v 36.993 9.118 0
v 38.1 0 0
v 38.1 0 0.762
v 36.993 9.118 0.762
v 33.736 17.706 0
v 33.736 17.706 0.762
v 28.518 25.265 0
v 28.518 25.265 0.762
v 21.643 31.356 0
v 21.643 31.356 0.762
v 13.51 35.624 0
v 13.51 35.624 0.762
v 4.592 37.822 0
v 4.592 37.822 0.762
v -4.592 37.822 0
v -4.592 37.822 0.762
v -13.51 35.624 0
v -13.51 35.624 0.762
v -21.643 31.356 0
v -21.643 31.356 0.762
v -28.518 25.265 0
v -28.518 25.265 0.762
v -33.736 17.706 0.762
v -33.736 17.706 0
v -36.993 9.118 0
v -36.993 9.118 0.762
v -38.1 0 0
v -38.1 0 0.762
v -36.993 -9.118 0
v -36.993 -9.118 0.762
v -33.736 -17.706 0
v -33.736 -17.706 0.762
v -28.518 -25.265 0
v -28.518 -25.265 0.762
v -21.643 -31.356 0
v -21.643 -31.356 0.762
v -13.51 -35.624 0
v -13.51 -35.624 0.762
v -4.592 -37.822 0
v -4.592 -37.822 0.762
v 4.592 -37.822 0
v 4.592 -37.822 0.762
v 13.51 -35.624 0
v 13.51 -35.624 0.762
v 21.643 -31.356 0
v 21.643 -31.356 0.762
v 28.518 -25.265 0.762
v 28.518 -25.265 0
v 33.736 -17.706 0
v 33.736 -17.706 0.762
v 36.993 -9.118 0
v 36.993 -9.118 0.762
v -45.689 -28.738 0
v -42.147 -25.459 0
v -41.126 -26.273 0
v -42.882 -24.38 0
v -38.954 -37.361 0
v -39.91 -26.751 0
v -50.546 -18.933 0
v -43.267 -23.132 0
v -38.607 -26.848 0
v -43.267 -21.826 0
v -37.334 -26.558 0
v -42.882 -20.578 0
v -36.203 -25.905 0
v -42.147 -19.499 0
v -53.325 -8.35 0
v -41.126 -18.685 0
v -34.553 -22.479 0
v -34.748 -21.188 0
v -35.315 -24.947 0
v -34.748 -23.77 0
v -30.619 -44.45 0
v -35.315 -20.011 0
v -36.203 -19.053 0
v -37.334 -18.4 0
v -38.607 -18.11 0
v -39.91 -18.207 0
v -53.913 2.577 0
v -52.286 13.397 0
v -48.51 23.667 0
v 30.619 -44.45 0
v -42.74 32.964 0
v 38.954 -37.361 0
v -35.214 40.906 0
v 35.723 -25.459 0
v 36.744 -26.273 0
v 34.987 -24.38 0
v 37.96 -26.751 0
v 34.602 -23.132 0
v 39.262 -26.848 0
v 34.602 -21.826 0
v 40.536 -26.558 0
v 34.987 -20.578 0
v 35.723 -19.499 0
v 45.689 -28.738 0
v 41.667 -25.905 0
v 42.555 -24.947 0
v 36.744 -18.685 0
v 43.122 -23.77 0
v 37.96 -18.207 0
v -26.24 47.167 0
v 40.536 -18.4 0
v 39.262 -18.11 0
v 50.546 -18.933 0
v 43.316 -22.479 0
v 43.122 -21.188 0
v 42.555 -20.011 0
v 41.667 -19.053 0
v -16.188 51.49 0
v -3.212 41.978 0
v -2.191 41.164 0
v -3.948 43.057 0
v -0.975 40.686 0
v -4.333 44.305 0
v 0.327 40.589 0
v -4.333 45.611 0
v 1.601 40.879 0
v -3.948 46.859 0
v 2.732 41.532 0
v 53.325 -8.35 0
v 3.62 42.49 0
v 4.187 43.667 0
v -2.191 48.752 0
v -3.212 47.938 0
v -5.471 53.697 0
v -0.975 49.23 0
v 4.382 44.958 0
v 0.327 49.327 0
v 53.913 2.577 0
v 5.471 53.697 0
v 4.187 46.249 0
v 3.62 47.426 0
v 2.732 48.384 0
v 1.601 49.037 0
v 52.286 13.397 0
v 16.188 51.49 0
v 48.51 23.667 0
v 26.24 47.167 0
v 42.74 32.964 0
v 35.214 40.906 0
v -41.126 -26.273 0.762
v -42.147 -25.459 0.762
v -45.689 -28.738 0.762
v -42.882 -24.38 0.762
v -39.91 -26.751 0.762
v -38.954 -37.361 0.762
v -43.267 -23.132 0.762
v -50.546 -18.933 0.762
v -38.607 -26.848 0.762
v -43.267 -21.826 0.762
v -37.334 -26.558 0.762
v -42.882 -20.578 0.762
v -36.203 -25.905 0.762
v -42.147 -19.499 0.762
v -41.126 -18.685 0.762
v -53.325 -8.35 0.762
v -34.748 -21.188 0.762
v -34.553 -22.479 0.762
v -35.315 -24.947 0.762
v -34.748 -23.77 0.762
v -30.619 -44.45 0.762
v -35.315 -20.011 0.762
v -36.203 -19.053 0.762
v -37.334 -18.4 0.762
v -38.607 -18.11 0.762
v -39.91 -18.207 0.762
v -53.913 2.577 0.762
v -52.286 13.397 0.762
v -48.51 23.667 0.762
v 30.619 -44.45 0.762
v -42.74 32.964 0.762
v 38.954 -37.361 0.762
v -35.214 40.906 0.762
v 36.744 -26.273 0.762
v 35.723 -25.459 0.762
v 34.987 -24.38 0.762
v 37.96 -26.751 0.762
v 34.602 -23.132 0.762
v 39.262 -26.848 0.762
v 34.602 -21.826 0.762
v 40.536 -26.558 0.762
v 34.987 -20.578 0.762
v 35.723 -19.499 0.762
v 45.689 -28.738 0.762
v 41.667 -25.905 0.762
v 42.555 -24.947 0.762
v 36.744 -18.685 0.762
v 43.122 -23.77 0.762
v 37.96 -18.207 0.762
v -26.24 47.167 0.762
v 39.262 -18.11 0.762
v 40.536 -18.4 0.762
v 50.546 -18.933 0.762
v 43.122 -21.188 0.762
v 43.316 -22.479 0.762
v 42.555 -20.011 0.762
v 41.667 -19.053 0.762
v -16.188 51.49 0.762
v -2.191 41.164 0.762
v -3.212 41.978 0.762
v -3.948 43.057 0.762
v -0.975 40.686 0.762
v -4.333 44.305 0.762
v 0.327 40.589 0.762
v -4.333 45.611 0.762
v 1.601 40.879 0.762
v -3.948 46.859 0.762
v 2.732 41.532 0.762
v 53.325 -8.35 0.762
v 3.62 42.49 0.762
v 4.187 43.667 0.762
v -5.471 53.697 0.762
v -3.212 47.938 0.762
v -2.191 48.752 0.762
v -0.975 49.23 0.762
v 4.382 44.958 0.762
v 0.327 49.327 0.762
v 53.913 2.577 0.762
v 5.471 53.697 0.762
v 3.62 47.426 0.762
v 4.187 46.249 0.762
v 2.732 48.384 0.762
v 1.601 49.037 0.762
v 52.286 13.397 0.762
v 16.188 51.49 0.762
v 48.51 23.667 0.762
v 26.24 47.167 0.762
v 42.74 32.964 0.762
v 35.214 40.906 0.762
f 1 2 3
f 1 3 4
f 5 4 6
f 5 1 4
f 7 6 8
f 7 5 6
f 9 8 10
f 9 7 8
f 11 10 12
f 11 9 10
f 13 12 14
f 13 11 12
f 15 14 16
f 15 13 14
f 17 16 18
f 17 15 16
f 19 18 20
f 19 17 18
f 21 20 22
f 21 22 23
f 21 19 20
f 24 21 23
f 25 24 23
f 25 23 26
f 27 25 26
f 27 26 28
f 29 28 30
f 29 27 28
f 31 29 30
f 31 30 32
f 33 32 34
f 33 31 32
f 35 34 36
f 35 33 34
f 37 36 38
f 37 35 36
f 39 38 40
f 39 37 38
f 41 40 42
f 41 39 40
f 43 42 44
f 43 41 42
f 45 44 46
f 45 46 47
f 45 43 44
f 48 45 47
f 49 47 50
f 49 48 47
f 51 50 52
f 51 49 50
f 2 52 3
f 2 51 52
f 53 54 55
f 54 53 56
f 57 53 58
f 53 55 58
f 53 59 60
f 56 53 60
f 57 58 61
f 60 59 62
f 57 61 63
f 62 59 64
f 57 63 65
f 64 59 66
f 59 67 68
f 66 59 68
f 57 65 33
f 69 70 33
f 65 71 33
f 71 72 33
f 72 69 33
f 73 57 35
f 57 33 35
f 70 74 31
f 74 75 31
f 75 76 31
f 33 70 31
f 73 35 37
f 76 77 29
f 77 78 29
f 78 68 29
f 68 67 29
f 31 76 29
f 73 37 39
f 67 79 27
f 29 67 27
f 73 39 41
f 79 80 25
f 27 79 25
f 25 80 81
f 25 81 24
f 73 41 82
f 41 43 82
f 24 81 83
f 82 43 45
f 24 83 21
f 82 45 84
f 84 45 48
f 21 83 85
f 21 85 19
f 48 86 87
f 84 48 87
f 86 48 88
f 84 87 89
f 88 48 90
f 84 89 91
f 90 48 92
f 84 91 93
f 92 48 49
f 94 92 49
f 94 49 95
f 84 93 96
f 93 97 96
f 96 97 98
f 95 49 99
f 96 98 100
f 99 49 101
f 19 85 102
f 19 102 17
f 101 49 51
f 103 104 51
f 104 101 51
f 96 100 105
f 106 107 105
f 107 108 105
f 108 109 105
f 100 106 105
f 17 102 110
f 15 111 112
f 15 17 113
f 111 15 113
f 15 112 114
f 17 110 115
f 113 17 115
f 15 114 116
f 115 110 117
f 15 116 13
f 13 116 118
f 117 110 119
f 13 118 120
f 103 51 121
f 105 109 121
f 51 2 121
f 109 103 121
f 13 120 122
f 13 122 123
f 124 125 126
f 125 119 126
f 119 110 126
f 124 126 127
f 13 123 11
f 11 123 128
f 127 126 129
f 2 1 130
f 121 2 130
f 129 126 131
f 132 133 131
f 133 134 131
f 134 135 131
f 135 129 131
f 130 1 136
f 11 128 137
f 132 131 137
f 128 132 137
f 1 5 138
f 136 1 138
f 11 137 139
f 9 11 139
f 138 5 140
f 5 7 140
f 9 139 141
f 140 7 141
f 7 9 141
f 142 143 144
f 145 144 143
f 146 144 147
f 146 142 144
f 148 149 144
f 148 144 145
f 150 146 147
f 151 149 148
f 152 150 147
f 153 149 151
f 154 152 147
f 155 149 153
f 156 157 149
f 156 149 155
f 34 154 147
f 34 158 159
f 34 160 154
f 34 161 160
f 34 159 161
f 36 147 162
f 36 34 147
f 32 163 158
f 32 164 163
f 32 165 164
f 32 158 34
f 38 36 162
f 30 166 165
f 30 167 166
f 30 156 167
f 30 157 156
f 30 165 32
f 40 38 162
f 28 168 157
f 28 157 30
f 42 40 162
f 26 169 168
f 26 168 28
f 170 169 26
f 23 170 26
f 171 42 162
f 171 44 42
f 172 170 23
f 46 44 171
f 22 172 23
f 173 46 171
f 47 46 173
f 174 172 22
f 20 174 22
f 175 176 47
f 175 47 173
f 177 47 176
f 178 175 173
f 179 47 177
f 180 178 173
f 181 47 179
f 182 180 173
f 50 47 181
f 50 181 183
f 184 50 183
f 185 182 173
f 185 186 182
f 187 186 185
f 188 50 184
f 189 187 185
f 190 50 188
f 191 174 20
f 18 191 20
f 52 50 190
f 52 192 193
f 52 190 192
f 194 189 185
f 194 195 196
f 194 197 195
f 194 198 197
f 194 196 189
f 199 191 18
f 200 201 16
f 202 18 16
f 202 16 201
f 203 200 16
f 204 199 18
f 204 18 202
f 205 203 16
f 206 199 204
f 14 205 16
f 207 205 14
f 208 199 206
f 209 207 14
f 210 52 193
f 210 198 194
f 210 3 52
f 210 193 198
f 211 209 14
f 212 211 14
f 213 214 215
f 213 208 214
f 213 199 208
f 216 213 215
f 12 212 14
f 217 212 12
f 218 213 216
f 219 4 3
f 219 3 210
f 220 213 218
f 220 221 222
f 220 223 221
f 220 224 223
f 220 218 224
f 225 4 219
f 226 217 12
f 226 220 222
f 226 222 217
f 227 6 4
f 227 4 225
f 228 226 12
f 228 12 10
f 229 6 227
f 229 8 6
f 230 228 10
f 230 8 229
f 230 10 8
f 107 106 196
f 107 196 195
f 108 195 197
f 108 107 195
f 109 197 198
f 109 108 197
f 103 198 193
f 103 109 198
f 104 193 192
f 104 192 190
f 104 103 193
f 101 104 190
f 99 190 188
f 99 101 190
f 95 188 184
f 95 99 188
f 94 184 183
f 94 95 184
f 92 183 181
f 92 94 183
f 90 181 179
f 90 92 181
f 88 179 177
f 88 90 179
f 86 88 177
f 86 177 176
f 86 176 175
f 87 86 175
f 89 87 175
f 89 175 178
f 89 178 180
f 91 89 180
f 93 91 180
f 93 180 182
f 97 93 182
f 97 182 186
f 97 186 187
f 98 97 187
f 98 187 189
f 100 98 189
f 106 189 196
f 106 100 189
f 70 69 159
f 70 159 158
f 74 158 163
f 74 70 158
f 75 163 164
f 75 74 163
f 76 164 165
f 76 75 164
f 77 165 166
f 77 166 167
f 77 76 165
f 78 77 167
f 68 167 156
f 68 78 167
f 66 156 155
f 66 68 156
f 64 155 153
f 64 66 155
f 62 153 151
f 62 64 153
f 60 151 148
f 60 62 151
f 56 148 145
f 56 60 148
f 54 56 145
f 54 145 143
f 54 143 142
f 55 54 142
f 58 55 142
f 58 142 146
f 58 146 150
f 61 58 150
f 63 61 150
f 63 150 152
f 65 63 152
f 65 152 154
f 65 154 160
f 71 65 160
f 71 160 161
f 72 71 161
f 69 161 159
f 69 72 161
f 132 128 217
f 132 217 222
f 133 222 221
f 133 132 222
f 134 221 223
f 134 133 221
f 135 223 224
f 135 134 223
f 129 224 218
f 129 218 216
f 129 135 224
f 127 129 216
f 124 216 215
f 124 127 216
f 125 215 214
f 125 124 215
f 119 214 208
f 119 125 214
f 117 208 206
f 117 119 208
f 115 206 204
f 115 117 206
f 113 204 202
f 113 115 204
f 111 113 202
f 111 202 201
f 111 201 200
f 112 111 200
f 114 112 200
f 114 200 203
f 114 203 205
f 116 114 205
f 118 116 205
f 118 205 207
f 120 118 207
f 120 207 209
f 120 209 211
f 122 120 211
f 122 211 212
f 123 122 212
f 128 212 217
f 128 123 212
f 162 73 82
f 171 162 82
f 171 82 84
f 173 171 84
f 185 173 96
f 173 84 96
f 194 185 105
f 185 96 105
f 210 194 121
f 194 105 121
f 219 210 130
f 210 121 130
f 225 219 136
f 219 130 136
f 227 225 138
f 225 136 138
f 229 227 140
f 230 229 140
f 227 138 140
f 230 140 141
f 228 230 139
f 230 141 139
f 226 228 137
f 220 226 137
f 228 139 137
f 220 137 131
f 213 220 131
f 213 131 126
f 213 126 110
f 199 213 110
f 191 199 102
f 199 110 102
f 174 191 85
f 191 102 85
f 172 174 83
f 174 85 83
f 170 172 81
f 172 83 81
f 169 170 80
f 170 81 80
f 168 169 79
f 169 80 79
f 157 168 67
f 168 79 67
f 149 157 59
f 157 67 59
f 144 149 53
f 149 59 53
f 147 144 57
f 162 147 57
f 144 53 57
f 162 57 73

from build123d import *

# Parameters (mm, degrees)
F0_R     = 4.3815
F0_R_2   = 38.1
F1_DEPTH = 0.762


with BuildPart() as f1:
    # F0 (on Top) → F1 (new body)
    with BuildSketch(Plane.XY):
        with BuildLine():
            Line((-30.618591, -44.45), (30.618591, -44.45))
            ThreePointArc((30.618591, -44.45), (0, 53.975), (-30.618591, -44.45))
        make_face()
        with Locations((-38.93477, -22.479)):
            Circle(F0_R, mode=Mode.SUBTRACT)
        with Locations((38.93477, -22.479)):
            Circle(F0_R, mode=Mode.SUBTRACT)
        Circle(F0_R_2, mode=Mode.SUBTRACT)
        with Locations((0, 44.958)):
            Circle(F0_R, mode=Mode.SUBTRACT)
    extrude(amount=F1_DEPTH)


solid = f1.part
